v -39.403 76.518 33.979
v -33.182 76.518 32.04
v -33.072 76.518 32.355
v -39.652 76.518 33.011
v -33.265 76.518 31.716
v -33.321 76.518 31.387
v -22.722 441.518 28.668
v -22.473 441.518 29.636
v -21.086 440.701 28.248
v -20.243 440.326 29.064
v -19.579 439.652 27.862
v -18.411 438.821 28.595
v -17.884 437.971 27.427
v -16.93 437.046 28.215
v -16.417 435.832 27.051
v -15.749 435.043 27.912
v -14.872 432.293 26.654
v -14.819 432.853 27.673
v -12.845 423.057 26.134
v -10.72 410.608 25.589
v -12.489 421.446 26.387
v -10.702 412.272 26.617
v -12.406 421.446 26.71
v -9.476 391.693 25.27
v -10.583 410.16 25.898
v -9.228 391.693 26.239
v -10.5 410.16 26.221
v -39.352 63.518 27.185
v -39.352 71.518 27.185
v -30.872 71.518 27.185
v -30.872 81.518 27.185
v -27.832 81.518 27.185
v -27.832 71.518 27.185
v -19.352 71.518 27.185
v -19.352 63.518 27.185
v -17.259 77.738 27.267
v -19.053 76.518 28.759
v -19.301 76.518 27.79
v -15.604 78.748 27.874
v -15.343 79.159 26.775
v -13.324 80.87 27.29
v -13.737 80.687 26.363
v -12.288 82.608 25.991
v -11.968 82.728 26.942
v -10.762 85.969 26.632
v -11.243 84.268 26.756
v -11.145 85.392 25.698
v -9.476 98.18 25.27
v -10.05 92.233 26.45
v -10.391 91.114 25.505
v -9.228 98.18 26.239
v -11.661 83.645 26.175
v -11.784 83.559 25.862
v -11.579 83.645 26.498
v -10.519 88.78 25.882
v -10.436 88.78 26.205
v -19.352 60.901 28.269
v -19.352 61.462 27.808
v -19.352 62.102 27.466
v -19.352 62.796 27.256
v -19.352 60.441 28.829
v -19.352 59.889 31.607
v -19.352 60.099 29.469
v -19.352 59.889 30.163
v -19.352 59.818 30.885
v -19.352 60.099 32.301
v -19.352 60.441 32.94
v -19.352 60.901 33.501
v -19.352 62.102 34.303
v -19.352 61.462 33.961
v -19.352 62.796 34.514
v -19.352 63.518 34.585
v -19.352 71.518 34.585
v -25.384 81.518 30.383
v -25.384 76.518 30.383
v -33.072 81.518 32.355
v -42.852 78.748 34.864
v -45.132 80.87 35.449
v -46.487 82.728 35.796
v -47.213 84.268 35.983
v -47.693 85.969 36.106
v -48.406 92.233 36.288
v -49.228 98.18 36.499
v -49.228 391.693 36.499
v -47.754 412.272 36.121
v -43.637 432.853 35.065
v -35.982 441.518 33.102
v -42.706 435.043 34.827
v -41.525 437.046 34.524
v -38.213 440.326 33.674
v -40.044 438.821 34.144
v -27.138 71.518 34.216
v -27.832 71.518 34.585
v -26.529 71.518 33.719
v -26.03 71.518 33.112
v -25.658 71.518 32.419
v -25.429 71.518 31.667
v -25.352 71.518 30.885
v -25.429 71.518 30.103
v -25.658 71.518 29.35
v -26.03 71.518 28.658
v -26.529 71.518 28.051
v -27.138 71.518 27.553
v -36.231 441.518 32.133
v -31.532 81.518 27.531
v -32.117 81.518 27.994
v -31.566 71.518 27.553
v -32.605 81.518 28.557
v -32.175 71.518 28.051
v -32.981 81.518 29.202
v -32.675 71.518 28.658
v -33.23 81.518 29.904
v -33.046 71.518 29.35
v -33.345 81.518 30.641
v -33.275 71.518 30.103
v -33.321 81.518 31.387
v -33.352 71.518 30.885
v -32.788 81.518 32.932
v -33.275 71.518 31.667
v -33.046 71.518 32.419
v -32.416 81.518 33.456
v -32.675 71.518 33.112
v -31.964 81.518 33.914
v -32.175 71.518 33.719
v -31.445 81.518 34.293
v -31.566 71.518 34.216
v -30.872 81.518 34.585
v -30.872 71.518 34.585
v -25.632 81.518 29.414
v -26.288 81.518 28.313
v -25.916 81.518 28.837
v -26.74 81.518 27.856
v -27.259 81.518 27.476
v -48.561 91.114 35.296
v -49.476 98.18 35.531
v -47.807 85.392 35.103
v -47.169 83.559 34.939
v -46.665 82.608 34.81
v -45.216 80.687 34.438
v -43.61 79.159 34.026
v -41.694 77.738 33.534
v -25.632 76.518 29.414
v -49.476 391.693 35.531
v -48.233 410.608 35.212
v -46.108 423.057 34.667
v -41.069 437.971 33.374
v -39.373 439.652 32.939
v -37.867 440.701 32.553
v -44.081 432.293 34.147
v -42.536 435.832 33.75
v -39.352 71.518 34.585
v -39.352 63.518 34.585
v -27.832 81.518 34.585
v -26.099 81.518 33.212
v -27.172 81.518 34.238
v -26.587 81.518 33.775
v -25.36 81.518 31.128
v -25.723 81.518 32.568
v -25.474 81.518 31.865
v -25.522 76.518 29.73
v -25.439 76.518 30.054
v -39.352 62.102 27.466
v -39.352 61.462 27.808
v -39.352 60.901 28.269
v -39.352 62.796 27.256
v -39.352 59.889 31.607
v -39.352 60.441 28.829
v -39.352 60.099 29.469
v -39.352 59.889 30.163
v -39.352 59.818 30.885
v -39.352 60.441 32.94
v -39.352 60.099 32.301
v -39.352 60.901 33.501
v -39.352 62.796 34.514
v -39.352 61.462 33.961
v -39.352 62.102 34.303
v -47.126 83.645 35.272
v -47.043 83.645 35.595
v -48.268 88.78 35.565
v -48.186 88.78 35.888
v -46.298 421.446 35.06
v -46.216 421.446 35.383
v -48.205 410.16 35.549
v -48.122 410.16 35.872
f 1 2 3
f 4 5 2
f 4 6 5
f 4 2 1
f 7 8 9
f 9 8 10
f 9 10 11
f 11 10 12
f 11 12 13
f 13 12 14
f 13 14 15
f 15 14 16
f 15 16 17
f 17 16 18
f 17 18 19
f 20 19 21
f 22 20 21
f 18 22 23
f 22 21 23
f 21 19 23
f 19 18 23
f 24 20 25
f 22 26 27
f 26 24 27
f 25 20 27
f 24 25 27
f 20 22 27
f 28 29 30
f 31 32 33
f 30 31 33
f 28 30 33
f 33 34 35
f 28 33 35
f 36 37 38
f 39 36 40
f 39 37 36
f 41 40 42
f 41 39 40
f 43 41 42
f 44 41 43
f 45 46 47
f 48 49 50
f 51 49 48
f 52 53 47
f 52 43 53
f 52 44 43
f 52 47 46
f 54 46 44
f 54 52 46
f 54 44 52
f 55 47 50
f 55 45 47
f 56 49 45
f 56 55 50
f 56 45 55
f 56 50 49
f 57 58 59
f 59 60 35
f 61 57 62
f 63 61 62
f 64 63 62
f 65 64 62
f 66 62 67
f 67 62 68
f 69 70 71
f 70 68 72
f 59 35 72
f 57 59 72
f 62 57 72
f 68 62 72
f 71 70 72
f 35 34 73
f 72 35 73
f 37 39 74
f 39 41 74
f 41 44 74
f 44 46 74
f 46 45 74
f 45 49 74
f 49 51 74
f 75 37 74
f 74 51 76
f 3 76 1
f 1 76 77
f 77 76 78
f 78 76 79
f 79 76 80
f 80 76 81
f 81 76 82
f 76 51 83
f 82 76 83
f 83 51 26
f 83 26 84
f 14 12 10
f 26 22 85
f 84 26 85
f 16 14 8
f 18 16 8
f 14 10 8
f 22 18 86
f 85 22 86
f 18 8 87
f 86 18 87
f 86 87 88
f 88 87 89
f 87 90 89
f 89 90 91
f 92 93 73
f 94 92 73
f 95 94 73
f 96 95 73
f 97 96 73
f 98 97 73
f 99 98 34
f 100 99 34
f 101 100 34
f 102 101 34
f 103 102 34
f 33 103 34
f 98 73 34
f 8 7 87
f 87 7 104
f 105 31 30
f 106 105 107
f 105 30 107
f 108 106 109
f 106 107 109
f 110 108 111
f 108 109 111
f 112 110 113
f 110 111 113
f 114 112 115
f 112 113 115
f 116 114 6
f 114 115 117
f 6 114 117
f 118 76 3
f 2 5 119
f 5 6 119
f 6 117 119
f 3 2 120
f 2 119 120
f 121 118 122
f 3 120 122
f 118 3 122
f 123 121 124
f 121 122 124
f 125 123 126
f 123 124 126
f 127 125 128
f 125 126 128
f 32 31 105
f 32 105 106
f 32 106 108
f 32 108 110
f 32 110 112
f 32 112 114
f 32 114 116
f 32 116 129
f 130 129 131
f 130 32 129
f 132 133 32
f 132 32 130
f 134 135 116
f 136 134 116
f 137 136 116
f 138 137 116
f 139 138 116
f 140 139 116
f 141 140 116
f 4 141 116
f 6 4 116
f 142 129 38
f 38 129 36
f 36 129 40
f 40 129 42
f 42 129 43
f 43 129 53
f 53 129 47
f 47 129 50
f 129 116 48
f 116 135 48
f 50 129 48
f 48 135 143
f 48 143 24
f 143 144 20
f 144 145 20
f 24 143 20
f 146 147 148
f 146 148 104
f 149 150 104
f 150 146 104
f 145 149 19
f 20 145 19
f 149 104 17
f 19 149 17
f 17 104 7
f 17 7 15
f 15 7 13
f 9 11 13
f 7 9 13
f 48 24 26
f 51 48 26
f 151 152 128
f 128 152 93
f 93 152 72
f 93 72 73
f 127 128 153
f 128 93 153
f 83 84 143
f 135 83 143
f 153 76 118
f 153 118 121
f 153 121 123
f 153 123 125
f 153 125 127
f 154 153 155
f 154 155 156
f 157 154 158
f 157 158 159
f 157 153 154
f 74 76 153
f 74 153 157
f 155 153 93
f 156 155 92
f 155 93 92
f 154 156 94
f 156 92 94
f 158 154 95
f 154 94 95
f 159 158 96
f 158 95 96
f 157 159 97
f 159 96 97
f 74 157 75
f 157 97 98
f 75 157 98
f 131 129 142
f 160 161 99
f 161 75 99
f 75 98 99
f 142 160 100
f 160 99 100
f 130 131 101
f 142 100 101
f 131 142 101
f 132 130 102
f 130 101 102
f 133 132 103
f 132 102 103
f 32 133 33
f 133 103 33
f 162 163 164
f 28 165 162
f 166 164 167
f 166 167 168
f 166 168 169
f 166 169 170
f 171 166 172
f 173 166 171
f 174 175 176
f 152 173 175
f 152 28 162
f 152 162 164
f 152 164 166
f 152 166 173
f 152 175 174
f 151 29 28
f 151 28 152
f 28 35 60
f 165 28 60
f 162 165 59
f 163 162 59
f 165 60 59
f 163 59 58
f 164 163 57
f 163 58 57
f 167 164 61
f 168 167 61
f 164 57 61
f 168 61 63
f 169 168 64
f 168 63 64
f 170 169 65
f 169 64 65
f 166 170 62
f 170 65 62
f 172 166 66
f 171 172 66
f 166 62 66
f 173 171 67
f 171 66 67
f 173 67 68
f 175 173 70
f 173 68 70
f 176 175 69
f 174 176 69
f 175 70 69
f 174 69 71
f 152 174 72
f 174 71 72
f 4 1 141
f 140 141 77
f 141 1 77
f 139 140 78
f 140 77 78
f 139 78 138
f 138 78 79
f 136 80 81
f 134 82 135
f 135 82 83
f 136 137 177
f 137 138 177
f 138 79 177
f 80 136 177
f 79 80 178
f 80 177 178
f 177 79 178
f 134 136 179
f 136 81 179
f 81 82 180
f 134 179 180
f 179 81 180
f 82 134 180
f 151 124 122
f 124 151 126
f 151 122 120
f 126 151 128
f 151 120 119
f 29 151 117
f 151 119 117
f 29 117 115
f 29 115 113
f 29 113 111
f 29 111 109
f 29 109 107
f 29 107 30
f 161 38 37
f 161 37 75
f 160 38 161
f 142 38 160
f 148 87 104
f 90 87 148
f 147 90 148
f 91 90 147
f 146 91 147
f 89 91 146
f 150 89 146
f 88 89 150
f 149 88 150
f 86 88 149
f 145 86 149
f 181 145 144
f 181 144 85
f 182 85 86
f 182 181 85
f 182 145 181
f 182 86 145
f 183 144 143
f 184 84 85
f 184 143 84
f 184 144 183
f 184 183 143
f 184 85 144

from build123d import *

# Parameters (mm, degrees)
EXTRUDE_1_DEPTH          = 10
EXTRUDE_2_DEPTH          = 10
EXTRUDE_3_DEPTH          = 360
EXTRUDE_3_DEPTH_BACK     = 5
CUT_EXTRUDE_1_DEPTH      = 10.938825861
CUT_EXTRUDE_1_DEPTH_BACK = 11.938825861


with BuildPart() as part:
    # 草图2 → 凸台-拉伸1 (new body, symmetric)
    with BuildSketch(Plane(origin=(-29.352134755, 0, 0), x_dir=(0, 0, -1), z_dir=(1, 0, 0))):
        with BuildLine():
            Line((-34.584801913, 63.517502407), (-34.584801913, 71.517502407))
            Line((-34.584801913, 71.517502407), (-27.184801913, 71.517502407))
            Line((-27.184801913, 71.517502407), (-27.184801913, 63.517502407))
            ThreePointArc((-27.184801913, 63.517502407), (-30.884801913, 59.817502407), (-34.584801913, 63.517502407))
        make_face()
    extrude(amount=EXTRUDE_1_DEPTH, both=True)

    # 草图4 → 凸台-拉伸2 (add)
    with BuildSketch(Plane(origin=(0, 71.517502407, 0), x_dir=(1, 0, 0), z_dir=(0, 1, 0))):
        with BuildLine():
            ThreePointArc((-30.872003171, -27.184801913), (-33.352134755, -30.884801913), (-30.872003171, -34.584801913))
            Line((-30.872003171, -34.584801913), (-27.83226634, -34.584801913))
            ThreePointArc((-27.83226634, -34.584801913), (-25.352134755, -30.884801913), (-27.83226634, -27.184801913))
            Line((-27.83226634, -27.184801913), (-30.872003171, -27.184801913))
        make_face()
    extrude(amount=EXTRUDE_2_DEPTH)

    # 草图7 → 凸台-拉伸3 (add, two sides)
    with BuildSketch(Plane(origin=(0, 81.517502407, 0), x_dir=(1, 0, 0), z_dir=(0, 1, 0))) as extrude_3_sk:
        Polygon((-49.227899432, -36.499423776), (-49.476370079, -35.53078435), (-9.476370079, -25.27018005), (-9.227899432, -26.238819476), align=None)
    extrude(amount=EXTRUDE_3_DEPTH)
    extrude(extrude_3_sk.sketch, amount=-EXTRUDE_3_DEPTH_BACK)

    # 草图8 → 切除-拉伸1 (cut, two sides)
    with BuildSketch(Plane(origin=(5.745409843, 0, 22.397939438), x_dir=(0.968639426, 0, -0.248470647), z_dir=(0.248470647, 0, 0.968639426))) as cut_extrude_1_sk:
        with BuildLine():
            Line((-56.753119678, 441.517502407), (-56.753119678, 391.692905165))
            add(Edge.make_bspline(
                [(-43.078776353, 441.517502407), (-51.216796387, 438.23058361), (-52.576278999, 425.112937891), (-56.382375341, 407.988441194), (-56.082947511, 397.823049203), (-56.753119678, 391.692905165)],
                knots=[0, 0, 0, 0, 0.351967416, 0.523137111, 0.799664718, 0.799664718, 0.799664718, 0.799664718], degree=3))
            Line((-43.078776353, 441.517502407), (-56.753119678, 441.517502407))
        make_face()
        with BuildLine():
            Line((-15.458083649, 441.517502407), (-29.132426973, 441.517502407))
            add(Edge.make_bspline(
                [(-29.132426973, 441.517502407), (-20.994406939, 438.23058361), (-19.634924328, 425.112937891), (-15.828827986, 407.988441194), (-16.128255816, 397.823049203), (-15.458083649, 391.692905165)],
                knots=[0, 0, 0, 0, 0.351967416, 0.523137111, 0.799664718, 0.799664718, 0.799664718, 0.799664718], degree=3))
            Line((-15.458083649, 391.692905165), (-15.458083649, 441.517502407))
        make_face()
        with BuildLine():
            Line((-15.458083649, 76.517502407), (-15.458083649, 98.17969781))
            add(Edge.make_bspline(
                [(-25.600815541, 76.517502407), (-22.657286276, 78.055965616), (-17.607813954, 81.639827622), (-16.337691235, 90.138636186), (-16.166046553, 95.417815279), (-15.458083649, 98.17969781)],
                knots=[0, 0, 0, 0, 0.237372494, 0.354242691, 0.564314689, 0.564314689, 0.564314689, 0.564314689], degree=3))
            Line((-25.600815541, 76.517502407), (-15.458083649, 76.517502407))
        make_face()
        with BuildLine():
            Line((-56.753119678, 76.517502407), (-46.610387786, 76.517502407))
            add(Edge.make_bspline(
                [(-46.610387786, 76.517502407), (-49.55391705, 78.055965616), (-54.603389372, 81.639827622), (-55.873512091, 90.138636186), (-56.045156774, 95.417815279), (-56.753119678, 98.17969781)],
                knots=[0, 0, 0, 0, 0.237372494, 0.354242691, 0.564314689, 0.564314689, 0.564314689, 0.564314689], degree=3))
            Line((-56.753119678, 98.17969781), (-56.753119678, 76.517502407))
        make_face()
    extrude(amount=CUT_EXTRUDE_1_DEPTH, mode=Mode.SUBTRACT)
    extrude(cut_extrude_1_sk.sketch, amount=-CUT_EXTRUDE_1_DEPTH_BACK, mode=Mode.SUBTRACT)


solid = part.part
